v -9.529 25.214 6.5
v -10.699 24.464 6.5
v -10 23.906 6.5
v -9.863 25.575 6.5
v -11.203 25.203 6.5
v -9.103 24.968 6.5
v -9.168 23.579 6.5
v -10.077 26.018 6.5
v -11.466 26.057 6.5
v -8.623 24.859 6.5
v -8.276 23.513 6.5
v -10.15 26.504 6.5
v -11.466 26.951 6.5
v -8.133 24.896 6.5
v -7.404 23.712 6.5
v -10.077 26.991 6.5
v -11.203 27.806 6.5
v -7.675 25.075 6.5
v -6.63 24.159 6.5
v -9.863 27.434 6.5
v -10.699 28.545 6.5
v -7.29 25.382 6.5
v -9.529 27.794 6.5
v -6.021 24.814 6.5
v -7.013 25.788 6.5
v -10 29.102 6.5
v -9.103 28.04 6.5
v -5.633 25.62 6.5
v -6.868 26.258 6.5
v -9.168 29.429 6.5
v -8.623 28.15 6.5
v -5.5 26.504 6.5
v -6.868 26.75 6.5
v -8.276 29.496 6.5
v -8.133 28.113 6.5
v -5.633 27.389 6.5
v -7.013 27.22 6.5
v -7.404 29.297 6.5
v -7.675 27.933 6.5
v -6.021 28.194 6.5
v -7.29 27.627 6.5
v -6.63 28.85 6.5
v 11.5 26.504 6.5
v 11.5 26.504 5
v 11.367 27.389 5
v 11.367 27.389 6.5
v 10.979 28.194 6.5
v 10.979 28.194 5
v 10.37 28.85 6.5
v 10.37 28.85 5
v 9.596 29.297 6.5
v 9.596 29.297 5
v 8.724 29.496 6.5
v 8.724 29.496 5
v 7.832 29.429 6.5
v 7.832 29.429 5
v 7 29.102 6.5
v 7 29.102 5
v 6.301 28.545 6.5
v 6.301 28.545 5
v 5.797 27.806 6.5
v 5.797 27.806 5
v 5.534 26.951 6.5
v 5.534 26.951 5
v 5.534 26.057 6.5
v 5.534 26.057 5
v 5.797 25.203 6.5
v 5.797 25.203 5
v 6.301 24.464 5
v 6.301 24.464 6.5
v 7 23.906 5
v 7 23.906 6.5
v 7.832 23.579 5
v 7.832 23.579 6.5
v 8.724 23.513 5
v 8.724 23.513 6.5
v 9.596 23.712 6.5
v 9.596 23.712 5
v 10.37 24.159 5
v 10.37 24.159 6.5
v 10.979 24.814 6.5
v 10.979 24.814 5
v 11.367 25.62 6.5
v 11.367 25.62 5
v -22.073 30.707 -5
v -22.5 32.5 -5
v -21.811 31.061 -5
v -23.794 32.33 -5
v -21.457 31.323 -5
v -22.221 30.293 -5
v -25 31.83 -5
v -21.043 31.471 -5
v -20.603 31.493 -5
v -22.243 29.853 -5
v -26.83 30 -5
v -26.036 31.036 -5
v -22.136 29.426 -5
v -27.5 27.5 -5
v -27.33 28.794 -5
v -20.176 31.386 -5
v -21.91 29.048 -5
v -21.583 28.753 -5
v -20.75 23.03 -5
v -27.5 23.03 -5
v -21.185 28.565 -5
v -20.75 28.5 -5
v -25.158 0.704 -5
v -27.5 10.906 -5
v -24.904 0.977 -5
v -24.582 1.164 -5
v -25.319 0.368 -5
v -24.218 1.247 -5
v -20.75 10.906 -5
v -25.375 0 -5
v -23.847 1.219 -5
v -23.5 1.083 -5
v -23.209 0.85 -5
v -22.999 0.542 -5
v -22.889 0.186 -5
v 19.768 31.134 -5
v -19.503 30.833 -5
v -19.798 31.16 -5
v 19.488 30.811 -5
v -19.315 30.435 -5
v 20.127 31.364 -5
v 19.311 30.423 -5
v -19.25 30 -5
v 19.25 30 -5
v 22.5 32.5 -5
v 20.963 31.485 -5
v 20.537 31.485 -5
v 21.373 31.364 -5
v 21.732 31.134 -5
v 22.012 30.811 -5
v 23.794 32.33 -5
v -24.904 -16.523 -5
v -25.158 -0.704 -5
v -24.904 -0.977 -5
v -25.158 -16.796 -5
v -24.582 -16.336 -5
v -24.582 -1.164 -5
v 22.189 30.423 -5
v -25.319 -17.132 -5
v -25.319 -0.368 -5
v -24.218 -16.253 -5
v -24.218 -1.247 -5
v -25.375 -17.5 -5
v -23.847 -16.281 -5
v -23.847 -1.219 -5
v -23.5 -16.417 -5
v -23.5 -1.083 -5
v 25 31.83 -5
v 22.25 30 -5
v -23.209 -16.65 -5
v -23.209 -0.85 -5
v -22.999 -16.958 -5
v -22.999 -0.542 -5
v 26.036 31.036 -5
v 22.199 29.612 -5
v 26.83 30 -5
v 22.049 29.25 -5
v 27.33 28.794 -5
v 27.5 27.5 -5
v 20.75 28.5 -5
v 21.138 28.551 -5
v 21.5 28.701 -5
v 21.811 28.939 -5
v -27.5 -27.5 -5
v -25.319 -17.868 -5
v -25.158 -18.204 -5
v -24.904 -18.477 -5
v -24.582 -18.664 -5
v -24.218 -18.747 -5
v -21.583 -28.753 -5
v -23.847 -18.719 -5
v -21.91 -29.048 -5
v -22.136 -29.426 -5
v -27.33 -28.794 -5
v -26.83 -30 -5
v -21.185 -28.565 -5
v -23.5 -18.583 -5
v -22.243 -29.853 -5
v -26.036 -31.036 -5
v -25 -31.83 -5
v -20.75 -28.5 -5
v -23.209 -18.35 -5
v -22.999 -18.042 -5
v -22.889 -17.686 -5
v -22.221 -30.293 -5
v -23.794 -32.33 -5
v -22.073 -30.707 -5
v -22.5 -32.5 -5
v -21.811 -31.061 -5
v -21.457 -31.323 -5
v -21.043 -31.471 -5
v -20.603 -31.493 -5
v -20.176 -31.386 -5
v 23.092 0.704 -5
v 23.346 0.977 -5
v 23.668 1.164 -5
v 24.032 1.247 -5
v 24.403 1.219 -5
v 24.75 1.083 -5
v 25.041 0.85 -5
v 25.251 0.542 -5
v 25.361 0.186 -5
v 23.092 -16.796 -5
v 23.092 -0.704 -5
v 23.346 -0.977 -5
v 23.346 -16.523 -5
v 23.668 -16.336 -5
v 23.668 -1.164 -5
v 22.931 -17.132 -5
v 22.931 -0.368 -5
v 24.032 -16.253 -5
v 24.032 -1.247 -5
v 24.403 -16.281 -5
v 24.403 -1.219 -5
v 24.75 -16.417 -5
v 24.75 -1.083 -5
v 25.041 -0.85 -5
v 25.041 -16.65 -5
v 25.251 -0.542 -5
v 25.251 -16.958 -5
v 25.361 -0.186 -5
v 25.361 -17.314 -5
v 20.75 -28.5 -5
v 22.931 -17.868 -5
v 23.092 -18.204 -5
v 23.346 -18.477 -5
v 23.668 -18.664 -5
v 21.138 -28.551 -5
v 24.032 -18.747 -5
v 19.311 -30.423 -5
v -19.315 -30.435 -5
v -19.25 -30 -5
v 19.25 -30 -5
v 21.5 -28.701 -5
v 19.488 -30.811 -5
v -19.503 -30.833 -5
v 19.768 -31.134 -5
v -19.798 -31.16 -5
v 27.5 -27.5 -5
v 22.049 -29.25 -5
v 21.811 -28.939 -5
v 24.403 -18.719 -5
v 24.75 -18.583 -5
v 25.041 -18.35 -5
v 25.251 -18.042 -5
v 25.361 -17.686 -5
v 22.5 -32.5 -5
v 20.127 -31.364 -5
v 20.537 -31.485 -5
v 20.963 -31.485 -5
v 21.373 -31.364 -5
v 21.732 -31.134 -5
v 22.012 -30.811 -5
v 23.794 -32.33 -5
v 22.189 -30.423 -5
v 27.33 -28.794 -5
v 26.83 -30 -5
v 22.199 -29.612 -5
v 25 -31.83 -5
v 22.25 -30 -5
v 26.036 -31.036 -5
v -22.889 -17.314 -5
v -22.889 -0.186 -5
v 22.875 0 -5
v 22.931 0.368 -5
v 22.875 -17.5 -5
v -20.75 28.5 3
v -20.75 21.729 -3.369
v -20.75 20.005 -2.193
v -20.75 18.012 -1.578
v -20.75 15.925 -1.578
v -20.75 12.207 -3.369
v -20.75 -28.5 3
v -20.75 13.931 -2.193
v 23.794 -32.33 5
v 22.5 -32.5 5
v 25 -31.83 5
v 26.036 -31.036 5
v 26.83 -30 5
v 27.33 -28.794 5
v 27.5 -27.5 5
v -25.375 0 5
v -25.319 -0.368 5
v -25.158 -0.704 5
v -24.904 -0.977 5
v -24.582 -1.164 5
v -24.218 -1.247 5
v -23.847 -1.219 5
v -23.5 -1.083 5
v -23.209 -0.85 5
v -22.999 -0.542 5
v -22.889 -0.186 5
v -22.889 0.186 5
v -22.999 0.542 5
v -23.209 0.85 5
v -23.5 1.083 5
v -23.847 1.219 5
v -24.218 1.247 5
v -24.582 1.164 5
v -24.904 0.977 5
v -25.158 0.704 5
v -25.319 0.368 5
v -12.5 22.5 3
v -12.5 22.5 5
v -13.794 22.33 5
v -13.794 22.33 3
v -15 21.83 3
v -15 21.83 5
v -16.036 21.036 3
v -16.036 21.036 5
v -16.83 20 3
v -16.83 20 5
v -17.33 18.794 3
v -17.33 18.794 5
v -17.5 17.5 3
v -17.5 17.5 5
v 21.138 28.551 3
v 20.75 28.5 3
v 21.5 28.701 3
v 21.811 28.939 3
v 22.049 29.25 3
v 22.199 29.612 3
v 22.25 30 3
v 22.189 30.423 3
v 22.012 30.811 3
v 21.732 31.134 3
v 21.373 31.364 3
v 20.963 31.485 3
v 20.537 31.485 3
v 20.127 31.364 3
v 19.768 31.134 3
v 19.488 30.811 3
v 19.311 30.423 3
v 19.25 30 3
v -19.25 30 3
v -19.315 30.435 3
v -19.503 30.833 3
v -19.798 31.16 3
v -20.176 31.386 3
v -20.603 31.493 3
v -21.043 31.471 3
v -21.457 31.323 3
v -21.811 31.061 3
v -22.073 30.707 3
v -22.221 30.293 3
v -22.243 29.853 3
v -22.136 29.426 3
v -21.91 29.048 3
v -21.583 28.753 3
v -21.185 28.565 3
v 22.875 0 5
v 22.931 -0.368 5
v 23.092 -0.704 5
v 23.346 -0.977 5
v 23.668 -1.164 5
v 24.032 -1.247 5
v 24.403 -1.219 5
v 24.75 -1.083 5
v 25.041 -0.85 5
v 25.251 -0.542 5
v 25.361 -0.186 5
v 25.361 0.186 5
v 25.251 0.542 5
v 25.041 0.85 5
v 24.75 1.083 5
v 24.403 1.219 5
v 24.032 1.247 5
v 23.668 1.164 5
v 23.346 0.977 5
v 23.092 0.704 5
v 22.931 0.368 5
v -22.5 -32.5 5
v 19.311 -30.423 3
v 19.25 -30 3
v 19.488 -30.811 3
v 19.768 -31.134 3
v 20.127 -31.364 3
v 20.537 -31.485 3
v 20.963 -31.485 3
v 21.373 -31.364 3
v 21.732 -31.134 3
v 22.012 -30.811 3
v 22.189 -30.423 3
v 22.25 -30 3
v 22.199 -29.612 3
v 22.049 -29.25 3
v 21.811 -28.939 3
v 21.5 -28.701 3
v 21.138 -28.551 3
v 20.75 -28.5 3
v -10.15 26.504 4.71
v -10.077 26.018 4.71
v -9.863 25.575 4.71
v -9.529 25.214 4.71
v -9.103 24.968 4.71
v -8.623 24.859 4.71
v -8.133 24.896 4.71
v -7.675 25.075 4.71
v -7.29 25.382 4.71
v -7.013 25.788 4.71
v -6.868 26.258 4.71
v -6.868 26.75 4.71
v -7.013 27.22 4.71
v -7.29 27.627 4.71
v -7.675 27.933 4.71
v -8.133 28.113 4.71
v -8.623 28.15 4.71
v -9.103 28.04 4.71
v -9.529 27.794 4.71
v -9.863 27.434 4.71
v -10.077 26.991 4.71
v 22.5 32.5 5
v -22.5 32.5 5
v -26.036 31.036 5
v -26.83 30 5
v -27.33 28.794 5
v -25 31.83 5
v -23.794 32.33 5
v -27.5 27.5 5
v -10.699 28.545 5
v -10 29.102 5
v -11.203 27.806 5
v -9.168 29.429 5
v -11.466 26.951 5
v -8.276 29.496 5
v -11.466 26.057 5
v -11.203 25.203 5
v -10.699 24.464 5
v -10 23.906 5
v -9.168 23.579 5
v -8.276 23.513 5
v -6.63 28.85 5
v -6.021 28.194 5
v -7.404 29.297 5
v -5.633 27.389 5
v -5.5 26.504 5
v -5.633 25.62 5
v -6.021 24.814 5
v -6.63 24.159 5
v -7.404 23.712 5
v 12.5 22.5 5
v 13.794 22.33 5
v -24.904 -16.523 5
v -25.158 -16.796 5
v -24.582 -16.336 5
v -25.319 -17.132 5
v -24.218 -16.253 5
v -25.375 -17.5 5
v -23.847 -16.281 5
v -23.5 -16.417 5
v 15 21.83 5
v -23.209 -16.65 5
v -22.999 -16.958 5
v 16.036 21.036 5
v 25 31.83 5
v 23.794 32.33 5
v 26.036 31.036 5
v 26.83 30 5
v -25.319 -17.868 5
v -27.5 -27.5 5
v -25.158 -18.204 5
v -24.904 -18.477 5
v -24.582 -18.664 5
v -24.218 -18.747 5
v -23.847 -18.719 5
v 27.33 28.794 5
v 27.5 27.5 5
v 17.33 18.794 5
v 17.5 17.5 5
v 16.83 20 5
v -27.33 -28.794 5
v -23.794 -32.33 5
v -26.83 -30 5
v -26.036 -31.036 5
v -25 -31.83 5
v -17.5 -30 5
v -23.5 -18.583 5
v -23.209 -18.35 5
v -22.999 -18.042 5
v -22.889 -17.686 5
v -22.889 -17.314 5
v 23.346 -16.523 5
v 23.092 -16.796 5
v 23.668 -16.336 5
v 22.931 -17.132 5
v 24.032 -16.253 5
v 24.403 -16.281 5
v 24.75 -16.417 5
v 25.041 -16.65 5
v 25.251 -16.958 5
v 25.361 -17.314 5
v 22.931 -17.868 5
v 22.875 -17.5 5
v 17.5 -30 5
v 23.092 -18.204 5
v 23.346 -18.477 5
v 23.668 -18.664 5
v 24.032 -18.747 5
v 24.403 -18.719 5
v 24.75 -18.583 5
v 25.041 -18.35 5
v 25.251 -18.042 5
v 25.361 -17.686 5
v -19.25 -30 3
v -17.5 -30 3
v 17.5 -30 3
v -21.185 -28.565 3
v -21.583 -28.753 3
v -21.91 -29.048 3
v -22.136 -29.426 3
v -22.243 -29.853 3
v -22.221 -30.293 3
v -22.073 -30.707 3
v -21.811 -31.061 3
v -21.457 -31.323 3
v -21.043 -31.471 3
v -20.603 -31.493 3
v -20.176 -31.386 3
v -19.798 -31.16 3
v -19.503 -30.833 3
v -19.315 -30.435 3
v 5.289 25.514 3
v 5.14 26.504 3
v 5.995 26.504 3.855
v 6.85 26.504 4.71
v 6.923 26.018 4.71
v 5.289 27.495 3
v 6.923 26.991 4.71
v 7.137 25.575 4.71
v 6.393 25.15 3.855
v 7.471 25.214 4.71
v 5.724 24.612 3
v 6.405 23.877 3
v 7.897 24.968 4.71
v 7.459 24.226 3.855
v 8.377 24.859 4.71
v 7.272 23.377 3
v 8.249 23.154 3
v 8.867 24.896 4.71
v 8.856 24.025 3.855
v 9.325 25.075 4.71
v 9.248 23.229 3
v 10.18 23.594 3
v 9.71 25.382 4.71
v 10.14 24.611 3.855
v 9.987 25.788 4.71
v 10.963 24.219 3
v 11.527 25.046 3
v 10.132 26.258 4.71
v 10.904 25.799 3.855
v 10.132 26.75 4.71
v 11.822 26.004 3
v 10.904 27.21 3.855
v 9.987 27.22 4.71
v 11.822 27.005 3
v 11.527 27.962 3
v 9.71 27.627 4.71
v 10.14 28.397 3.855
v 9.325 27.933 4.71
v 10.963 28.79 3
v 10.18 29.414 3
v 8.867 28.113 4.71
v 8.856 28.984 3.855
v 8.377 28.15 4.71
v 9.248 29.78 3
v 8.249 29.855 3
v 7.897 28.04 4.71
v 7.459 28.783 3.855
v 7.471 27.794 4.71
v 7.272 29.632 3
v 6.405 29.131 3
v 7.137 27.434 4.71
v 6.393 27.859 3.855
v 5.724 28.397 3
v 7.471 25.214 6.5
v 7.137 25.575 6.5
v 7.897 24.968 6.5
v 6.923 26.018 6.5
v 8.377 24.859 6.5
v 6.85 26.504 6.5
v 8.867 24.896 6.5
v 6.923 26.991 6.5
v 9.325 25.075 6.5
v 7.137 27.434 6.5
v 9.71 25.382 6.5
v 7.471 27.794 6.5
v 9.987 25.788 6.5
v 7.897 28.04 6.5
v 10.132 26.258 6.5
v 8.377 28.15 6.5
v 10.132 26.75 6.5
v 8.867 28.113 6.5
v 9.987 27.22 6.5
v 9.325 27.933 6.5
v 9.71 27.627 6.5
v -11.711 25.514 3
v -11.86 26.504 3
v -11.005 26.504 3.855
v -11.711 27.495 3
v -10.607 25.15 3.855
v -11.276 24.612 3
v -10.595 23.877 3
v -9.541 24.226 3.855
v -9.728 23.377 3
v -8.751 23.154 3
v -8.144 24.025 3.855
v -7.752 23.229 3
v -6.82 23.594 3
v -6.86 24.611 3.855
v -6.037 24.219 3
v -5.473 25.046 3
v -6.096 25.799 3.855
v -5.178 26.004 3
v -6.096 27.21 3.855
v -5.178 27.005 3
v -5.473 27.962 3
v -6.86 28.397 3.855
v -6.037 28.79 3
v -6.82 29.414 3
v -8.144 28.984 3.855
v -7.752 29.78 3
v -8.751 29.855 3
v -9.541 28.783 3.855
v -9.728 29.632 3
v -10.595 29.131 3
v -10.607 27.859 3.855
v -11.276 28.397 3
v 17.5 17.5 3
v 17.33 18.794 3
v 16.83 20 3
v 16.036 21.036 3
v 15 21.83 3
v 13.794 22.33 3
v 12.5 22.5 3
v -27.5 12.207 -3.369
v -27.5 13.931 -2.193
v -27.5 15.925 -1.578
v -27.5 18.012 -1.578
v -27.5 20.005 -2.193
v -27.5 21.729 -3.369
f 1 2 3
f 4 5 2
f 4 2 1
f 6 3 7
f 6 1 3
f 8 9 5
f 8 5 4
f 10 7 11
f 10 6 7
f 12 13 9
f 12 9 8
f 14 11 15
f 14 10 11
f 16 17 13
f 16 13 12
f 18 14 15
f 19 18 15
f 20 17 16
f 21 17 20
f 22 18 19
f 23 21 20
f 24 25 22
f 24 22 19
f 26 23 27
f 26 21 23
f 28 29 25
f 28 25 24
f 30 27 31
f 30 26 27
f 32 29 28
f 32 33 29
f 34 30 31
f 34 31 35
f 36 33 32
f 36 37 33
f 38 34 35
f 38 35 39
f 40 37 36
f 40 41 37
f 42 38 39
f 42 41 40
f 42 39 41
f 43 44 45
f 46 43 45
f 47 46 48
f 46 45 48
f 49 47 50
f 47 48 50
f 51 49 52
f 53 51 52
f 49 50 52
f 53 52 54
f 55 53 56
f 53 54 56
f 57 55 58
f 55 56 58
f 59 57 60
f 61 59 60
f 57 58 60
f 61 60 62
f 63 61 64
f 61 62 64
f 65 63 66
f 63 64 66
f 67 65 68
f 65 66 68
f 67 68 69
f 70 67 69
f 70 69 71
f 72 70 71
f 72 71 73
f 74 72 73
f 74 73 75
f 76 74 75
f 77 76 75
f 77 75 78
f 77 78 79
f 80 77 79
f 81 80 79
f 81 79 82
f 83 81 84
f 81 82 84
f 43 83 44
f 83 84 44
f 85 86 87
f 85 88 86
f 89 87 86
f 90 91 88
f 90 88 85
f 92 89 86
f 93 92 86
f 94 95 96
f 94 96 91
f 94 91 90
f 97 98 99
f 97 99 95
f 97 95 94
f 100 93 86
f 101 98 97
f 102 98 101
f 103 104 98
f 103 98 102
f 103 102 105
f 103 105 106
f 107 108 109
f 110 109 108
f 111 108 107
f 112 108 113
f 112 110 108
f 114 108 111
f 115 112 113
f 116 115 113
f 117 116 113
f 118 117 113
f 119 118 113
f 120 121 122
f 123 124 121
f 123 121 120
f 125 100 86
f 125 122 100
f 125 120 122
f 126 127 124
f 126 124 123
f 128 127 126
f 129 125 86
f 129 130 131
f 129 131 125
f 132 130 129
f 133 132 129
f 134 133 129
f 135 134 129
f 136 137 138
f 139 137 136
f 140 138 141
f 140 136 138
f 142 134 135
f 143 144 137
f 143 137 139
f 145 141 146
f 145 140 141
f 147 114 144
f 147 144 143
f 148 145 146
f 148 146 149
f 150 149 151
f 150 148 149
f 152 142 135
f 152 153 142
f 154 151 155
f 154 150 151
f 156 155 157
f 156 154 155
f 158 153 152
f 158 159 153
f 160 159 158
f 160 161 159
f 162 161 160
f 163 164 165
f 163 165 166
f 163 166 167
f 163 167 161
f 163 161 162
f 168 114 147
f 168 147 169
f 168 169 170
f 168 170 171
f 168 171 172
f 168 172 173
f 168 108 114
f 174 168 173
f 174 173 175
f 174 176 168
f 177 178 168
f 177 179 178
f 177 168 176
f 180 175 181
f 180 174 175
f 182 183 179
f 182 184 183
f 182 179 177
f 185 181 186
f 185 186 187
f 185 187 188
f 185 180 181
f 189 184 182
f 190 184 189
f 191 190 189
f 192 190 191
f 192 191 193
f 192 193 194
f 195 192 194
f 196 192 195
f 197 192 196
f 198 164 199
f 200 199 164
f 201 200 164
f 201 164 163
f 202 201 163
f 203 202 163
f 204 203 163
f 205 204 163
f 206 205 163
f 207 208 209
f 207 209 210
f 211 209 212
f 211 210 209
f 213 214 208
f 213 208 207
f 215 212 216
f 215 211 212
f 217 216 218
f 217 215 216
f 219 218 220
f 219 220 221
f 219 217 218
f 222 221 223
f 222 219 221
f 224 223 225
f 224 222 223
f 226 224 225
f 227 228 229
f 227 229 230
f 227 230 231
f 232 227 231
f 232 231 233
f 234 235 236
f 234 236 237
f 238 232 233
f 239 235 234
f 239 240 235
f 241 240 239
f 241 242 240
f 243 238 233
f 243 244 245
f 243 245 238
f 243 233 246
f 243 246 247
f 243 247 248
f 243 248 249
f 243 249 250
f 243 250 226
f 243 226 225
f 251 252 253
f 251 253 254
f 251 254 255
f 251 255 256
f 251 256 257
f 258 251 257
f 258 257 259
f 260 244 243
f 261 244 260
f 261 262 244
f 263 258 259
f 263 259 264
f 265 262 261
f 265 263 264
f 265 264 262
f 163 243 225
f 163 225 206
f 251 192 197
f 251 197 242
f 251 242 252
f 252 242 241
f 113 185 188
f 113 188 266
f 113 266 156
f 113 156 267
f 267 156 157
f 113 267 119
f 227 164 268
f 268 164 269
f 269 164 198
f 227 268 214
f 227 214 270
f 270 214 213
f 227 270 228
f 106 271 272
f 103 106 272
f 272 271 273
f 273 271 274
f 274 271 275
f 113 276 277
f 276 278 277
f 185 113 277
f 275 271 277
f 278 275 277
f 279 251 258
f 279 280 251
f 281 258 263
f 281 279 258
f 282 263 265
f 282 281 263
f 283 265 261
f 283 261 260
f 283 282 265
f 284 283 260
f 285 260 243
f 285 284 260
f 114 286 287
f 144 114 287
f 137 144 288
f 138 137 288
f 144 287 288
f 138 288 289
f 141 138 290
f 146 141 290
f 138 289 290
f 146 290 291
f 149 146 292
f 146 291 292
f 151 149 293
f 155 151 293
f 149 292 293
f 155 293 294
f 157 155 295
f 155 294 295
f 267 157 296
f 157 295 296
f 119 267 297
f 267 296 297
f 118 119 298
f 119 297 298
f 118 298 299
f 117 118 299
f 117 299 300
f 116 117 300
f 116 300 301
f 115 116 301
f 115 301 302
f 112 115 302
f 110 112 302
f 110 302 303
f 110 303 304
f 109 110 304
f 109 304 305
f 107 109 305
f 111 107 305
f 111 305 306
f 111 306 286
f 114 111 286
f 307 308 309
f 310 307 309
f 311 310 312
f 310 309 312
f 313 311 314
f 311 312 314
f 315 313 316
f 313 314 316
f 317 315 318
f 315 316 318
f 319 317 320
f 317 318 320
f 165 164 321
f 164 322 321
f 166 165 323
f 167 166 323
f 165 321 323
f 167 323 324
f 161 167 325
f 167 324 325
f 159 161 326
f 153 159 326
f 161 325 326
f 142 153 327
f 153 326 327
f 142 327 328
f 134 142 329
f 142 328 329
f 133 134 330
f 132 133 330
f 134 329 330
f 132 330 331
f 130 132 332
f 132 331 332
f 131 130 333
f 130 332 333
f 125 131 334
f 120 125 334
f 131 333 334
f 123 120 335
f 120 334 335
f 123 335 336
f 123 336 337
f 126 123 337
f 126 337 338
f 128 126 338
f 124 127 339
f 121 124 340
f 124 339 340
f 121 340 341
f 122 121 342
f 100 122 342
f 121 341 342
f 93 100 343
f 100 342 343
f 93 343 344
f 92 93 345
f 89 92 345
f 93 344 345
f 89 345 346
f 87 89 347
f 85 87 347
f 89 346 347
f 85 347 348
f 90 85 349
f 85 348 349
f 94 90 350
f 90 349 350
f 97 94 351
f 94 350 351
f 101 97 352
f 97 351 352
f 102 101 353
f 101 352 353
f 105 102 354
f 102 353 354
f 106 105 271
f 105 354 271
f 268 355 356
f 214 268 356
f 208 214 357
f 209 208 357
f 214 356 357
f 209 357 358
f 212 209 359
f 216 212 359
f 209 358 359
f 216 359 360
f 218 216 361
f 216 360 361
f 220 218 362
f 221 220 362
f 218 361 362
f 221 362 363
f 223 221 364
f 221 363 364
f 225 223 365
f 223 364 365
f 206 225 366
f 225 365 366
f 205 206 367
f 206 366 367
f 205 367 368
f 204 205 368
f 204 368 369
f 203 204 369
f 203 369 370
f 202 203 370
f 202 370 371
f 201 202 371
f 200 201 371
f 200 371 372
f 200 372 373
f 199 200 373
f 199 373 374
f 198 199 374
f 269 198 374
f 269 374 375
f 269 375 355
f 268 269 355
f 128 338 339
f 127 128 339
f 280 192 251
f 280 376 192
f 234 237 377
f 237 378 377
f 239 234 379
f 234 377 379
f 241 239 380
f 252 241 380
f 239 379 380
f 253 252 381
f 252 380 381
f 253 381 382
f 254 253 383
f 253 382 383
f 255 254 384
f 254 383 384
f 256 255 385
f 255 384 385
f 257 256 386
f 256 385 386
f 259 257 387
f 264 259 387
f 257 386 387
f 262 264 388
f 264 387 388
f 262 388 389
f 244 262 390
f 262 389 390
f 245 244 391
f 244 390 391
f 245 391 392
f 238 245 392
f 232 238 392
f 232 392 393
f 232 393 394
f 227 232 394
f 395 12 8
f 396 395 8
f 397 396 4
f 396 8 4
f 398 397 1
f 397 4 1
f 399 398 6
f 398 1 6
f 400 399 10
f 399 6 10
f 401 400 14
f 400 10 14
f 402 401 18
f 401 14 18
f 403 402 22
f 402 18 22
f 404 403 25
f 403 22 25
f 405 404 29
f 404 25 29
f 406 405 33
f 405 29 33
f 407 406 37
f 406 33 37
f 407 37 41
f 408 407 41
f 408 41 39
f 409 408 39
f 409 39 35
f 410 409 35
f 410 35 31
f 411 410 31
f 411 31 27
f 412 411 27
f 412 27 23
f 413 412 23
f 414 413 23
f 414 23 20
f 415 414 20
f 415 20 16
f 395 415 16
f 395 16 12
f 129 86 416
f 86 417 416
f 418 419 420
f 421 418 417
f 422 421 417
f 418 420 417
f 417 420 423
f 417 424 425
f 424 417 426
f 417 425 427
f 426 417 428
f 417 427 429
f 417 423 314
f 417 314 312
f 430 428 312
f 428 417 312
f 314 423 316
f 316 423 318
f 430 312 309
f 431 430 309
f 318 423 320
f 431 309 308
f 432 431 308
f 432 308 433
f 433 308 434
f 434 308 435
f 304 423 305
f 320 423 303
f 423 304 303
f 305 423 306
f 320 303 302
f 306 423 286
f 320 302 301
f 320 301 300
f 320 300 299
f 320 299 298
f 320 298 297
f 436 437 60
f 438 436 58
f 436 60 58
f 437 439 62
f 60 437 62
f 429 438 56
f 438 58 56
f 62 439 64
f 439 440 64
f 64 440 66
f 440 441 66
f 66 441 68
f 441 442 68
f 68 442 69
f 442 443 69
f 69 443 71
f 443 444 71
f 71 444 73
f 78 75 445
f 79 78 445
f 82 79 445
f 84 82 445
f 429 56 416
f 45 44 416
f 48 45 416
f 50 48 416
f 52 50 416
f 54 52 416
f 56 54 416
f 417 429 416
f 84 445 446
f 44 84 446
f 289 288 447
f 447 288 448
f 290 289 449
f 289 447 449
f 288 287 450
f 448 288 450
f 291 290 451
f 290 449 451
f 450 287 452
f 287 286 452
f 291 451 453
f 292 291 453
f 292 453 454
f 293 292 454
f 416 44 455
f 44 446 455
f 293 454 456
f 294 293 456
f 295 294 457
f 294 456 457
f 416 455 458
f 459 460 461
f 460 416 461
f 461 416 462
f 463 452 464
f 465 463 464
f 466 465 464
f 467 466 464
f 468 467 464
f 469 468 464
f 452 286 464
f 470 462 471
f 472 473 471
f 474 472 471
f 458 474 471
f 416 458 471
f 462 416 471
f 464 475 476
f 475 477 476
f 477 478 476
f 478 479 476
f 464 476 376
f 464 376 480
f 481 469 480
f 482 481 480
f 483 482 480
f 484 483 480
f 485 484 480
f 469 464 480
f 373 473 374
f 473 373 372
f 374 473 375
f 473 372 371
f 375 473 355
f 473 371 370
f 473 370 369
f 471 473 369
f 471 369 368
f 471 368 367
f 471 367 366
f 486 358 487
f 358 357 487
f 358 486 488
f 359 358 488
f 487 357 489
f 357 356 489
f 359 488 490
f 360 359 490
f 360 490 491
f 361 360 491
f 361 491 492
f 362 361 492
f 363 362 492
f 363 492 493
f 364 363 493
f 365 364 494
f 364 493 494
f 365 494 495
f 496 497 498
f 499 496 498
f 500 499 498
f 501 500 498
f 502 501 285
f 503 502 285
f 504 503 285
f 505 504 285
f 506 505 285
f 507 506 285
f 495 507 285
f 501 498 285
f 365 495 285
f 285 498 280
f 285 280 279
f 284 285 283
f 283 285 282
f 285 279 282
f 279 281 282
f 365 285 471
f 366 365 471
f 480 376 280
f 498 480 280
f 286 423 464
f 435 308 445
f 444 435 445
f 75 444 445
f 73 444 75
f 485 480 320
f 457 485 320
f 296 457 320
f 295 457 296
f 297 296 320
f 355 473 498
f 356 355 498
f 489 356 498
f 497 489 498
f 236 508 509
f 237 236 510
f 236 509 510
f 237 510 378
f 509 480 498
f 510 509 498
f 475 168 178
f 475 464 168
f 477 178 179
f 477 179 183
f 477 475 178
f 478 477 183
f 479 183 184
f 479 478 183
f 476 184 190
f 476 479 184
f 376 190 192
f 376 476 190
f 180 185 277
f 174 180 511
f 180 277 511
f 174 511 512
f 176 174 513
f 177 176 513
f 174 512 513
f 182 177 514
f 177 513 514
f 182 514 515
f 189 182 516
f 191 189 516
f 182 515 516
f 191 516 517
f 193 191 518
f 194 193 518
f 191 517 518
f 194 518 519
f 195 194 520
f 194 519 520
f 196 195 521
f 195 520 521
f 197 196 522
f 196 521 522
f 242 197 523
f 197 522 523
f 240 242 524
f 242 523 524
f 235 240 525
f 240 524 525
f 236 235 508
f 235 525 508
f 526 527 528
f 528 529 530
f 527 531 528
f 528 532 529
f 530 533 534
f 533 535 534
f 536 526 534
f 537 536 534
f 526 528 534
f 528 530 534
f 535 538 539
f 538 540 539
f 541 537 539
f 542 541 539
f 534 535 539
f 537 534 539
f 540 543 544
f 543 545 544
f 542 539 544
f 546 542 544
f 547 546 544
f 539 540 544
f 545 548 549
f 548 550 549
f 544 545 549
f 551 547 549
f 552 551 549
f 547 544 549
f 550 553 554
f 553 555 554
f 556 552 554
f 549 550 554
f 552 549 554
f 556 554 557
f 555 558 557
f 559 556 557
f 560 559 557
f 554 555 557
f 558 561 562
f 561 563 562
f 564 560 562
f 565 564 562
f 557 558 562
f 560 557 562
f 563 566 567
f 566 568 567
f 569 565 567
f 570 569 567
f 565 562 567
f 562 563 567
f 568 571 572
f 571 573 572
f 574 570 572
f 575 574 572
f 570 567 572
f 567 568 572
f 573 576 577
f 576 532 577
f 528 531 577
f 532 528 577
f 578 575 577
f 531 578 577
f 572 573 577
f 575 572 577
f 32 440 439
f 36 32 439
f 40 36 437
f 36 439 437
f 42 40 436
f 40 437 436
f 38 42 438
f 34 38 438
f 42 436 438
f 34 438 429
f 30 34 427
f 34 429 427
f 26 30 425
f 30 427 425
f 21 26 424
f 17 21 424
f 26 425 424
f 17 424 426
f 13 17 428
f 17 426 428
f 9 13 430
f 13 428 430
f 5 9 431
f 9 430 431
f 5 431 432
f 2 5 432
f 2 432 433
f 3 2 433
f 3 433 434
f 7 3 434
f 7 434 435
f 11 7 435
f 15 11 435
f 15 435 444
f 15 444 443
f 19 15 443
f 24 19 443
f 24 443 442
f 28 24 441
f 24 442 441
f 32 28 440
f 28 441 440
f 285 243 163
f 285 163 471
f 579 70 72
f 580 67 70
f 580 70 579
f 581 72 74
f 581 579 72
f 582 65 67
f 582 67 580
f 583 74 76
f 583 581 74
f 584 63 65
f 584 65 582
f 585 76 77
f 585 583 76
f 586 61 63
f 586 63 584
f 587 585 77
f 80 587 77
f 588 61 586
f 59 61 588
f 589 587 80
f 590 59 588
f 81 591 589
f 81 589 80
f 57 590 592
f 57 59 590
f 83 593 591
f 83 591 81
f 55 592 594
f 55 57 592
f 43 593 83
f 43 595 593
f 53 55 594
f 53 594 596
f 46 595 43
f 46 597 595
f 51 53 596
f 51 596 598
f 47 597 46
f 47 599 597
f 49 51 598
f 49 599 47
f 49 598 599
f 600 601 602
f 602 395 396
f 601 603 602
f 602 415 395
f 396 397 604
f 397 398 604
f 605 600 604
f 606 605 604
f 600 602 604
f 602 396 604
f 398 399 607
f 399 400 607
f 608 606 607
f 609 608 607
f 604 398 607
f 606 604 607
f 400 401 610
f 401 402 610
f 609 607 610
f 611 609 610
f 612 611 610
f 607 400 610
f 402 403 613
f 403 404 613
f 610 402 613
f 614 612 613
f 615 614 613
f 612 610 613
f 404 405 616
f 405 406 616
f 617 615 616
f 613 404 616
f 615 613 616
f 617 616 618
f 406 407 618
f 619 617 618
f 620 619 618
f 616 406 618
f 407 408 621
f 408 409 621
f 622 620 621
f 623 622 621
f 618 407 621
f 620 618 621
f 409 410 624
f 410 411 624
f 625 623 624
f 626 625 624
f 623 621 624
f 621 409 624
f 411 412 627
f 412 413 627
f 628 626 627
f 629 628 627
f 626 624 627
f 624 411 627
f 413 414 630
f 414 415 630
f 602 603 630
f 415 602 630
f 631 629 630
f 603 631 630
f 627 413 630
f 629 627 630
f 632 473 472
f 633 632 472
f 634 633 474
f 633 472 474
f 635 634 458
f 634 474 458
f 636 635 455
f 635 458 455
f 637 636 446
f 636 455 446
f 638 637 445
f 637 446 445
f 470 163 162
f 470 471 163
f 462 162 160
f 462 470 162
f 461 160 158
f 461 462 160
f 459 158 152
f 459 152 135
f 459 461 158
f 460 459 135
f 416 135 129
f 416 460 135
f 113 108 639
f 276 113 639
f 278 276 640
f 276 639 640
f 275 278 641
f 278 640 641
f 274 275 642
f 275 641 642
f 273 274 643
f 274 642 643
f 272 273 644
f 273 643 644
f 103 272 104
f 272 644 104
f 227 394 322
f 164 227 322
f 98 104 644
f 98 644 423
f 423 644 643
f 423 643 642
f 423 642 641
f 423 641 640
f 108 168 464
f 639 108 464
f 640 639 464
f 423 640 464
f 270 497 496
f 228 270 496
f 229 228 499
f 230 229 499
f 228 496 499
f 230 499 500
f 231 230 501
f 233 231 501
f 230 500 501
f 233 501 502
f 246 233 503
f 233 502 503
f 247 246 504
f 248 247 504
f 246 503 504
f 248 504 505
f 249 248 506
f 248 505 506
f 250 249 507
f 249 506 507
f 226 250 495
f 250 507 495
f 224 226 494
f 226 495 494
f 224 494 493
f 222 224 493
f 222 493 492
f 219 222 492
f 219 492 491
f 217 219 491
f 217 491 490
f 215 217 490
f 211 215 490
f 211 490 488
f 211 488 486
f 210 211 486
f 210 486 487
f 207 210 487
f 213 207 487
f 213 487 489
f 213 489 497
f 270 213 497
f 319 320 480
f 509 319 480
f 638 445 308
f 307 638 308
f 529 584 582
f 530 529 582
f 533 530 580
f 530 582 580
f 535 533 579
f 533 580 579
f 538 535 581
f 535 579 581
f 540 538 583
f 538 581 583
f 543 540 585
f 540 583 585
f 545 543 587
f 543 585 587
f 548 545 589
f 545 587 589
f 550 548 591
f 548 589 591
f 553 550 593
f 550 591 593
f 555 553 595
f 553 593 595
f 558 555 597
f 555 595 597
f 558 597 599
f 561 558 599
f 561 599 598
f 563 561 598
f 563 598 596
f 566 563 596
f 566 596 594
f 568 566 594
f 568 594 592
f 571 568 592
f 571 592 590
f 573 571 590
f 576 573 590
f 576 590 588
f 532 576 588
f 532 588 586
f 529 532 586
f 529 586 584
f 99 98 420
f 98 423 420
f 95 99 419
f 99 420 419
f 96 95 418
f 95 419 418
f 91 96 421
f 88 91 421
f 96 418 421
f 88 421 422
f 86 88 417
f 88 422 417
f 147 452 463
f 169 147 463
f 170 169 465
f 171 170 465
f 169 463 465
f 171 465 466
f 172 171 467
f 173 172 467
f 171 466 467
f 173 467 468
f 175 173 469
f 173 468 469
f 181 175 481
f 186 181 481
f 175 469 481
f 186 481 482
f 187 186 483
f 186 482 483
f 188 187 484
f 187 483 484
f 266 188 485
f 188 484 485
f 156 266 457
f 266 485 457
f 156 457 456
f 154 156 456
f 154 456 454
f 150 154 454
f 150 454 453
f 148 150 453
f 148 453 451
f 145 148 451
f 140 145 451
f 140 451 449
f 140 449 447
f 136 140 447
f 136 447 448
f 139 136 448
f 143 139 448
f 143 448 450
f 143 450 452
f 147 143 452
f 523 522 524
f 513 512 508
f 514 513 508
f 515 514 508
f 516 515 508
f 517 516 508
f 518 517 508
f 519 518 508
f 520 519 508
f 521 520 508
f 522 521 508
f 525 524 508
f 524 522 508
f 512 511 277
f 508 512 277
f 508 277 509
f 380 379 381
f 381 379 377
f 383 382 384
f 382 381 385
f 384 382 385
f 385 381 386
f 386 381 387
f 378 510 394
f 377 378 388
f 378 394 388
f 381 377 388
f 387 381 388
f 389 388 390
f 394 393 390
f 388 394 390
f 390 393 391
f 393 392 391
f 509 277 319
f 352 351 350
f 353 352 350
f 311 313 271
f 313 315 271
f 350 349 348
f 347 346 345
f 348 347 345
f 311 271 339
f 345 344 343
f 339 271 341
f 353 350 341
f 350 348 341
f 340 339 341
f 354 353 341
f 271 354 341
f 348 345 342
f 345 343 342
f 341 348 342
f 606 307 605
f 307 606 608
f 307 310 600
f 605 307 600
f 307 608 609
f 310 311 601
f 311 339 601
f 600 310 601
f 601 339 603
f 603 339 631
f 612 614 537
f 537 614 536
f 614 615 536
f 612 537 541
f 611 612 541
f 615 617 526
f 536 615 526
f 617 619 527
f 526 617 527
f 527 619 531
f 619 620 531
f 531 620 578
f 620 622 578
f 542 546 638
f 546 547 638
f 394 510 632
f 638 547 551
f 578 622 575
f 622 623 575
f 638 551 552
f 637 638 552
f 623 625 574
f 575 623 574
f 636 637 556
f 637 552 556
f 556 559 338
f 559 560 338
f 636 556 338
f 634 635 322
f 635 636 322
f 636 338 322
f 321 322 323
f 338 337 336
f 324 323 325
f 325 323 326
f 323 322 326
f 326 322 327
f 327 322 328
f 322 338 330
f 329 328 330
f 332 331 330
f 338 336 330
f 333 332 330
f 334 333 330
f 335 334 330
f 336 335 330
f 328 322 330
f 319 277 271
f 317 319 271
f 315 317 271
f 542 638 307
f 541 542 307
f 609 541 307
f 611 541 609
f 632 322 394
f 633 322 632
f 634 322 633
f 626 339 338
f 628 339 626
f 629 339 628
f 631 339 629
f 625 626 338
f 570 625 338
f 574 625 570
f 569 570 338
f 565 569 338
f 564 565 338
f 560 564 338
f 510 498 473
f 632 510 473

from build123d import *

# Parameters (mm, degrees)
F0_W            = 55
F0_H            = 10
F1_DEPTH        = 32.5
F3_R            = 5
F4_DEPTH        = 12.5
F6_DEPTH        = 30
F7_DEPTH        = 3
F9_D            = 3.3
F9_CSINK_D      = 6.72
F9_CSINK_ANGLE  = 90
F10_R           = 3
F11_DEPTH       = 1.5
F12_D           = 3.3
F12_DEPTH       = 13.5
F12_CSINK_D     = 6.72
F12_CSINK_ANGLE = 90
F12_TIP         = 0.9914200214
F14_D           = 2.5
F14_DEPTH       = 13.5
F14_TIP         = 0.7510757738
F16_DEPTH       = 12


# Not quite as in the source:
# - a feature names something its author has since deleted; it is built from what else it names


with BuildPart() as f1:
    # F0 (on Front) → F1 (new body, symmetric)
    with BuildSketch(Plane.XZ):
        Rectangle(F0_W, F0_H)
    extrude(amount=F1_DEPTH, both=True)

    # F3
    f3_edges = [f1.edges().sort_by_distance(p)[0] for p in [
        (27.5, -32.5, 0),
        (-27.5, -32.5, 0),
        (-27.5, 32.5, 0),
        (27.5, 32.5, 0),
    ]]
    fillet(f3_edges, radius=F3_R)

    # F2 (on Top) → F4 (cut, symmetric)
    with BuildSketch(Plane.XY):
        with BuildLine():
            ThreePointArc((-12.5, 22.5), (-16.0355339059, 21.0355339059), (-17.5, 17.5))
            Line((-17.5, 17.5), (-17.5, -30))
            Line((-17.5, -30), (17.5, -30))
            Line((17.5, -30), (17.5, 17.5))
            ThreePointArc((17.5, 17.5), (16.0355339059, 21.0355339059), (12.5, 22.5))
            Line((12.5, 22.5), (-12.5, 22.5))
        make_face()
    extrude(amount=F4_DEPTH, both=True, mode=Mode.SUBTRACT)

    # F5 (on Top) → F6 (cut)
    with BuildSketch(Plane.XY):
        with BuildLine():
            ThreePointArc((-20.75, -28.5), (-21.8106601718, -31.0606601718), (-19.25, -30))
            Line((-19.25, -30), (-20.75, -30))
            Line((-20.75, -30), (-20.75, -28.5))
        make_face()
        with BuildLine():
            ThreePointArc((-20.75, -28.5), (-19.6893398282, -28.9393398282), (-19.25, -30))
            Line((-19.25, -30), (19.25, -30))
            ThreePointArc((19.25, -30), (19.6893398282, -28.9393398282), (20.75, -28.5))
            Line((20.75, -28.5), (20.75, 28.5))
            ThreePointArc((20.75, 28.5), (19.6893398282, 28.9393398282), (19.25, 30))
            Line((19.25, 30), (-19.25, 30))
            ThreePointArc((-19.25, 30), (-19.6893398282, 28.9393398282), (-20.75, 28.5))
            Line((-20.75, 28.5), (-20.75, -28.5))
        make_face()
        with BuildLine():
            Line((-20.75, -30), (-19.25, -30))
            ThreePointArc((-19.25, -30), (-19.6893398282, -28.9393398282), (-20.75, -28.5))
            Line((-20.75, -28.5), (-20.75, -30))
        make_face()
        with BuildLine():
            ThreePointArc((20.75, -28.5), (19.6893398282, -28.9393398282), (19.25, -30))
            Line((19.25, -30), (20.75, -30))
            Line((20.75, -30), (20.75, -28.5))
        make_face()
        with BuildLine():
            Line((20.75, -30), (19.25, -30))
            ThreePointArc((19.25, -30), (20.75, -31.5), (22.25, -30))
            ThreePointArc((22.25, -30), (21.8106601718, -28.9393398282), (20.75, -28.5))
            Line((20.75, -28.5), (20.75, -30))
        make_face()
        with BuildLine():
            ThreePointArc((-19.25, 30), (-21.8106601718, 31.0606601718), (-20.75, 28.5))
            Line((-20.75, 28.5), (-20.75, 30))
            Line((-20.75, 30), (-19.25, 30))
        make_face()
        with BuildLine():
            Line((-20.75, 30), (-20.75, 28.5))
            ThreePointArc((-20.75, 28.5), (-19.6893398282, 28.9393398282), (-19.25, 30))
            Line((-19.25, 30), (-20.75, 30))
        make_face()
        with BuildLine():
            ThreePointArc((19.25, 30), (19.6893398282, 28.9393398282), (20.75, 28.5))
            Line((20.75, 28.5), (20.75, 30))
            Line((20.75, 30), (19.25, 30))
        make_face()
        with BuildLine():
            Line((20.75, 30), (20.75, 28.5))
            ThreePointArc((20.75, 28.5), (21.8106601718, 28.9393398282), (22.25, 30))
            ThreePointArc((22.25, 30), (20.75, 31.5), (19.25, 30))
            Line((19.25, 30), (20.75, 30))
        make_face()
    extrude(amount=-F6_DEPTH, mode=Mode.SUBTRACT)

    # F5 (on Top) → F7 (cut)
    with BuildSketch(Plane.XY):
        with BuildLine():
            ThreePointArc((-20.75, -28.5), (-21.8106601718, -31.0606601718), (-19.25, -30))
            Line((-19.25, -30), (-20.75, -30))
            Line((-20.75, -30), (-20.75, -28.5))
        make_face()
        with BuildLine():
            ThreePointArc((-20.75, -28.5), (-19.6893398282, -28.9393398282), (-19.25, -30))
            Line((-19.25, -30), (19.25, -30))
            ThreePointArc((19.25, -30), (19.6893398282, -28.9393398282), (20.75, -28.5))
            Line((20.75, -28.5), (20.75, 28.5))
            ThreePointArc((20.75, 28.5), (19.6893398282, 28.9393398282), (19.25, 30))
            Line((19.25, 30), (-19.25, 30))
            ThreePointArc((-19.25, 30), (-19.6893398282, 28.9393398282), (-20.75, 28.5))
            Line((-20.75, 28.5), (-20.75, -28.5))
        make_face()
        with BuildLine():
            Line((-20.75, -30), (-19.25, -30))
            ThreePointArc((-19.25, -30), (-19.6893398282, -28.9393398282), (-20.75, -28.5))
            Line((-20.75, -28.5), (-20.75, -30))
        make_face()
        with BuildLine():
            ThreePointArc((20.75, -28.5), (19.6893398282, -28.9393398282), (19.25, -30))
            Line((19.25, -30), (20.75, -30))
            Line((20.75, -30), (20.75, -28.5))
        make_face()
        with BuildLine():
            Line((20.75, -30), (19.25, -30))
            ThreePointArc((19.25, -30), (20.75, -31.5), (22.25, -30))
            ThreePointArc((22.25, -30), (21.8106601718, -28.9393398282), (20.75, -28.5))
            Line((20.75, -28.5), (20.75, -30))
        make_face()
        with BuildLine():
            ThreePointArc((-19.25, 30), (-21.8106601718, 31.0606601718), (-20.75, 28.5))
            Line((-20.75, 28.5), (-20.75, 30))
            Line((-20.75, 30), (-19.25, 30))
        make_face()
        with BuildLine():
            Line((-20.75, 30), (-20.75, 28.5))
            ThreePointArc((-20.75, 28.5), (-19.6893398282, 28.9393398282), (-19.25, 30))
            Line((-19.25, 30), (-20.75, 30))
        make_face()
        with BuildLine():
            ThreePointArc((19.25, 30), (19.6893398282, 28.9393398282), (20.75, 28.5))
            Line((20.75, 28.5), (20.75, 30))
            Line((20.75, 30), (19.25, 30))
        make_face()
        with BuildLine():
            Line((20.75, 30), (20.75, 28.5))
            ThreePointArc((20.75, 28.5), (21.8106601718, 28.9393398282), (22.25, 30))
            ThreePointArc((22.25, 30), (20.75, 31.5), (19.25, 30))
            Line((19.25, 30), (20.75, 30))
        make_face()
    extrude(amount=F7_DEPTH, mode=Mode.SUBTRACT)

    # F9 (through all)
    with Locations(Plane(origin=(0, 0, 3), x_dir=(1, 0, 0), z_dir=(0, 0, -1))):
        with Locations((-8.5, -26.5042820722), (8.5, -26.5042820722)):
            CounterSinkHole(F9_D / 2, F9_CSINK_D / 2, counter_sink_angle=F9_CSINK_ANGLE)

    # F10 (on face) → F11 (join)
    with BuildSketch(Plane.XY.offset(5)):
        with Locations((8.5, 26.5042820722)):
            Circle(F10_R)
        with Locations((-8.5, 26.5042820722)):
            Circle(F10_R)
    extrude(amount=F11_DEPTH)

    # F12
    with Locations(Plane(origin=(0, 0, 3), x_dir=(1, 0, 0), z_dir=(0, 0, -1))):
        with Locations((-8.5, -26.5042820722), (8.5, -26.5042820722)):
            CounterSinkHole(F12_D / 2, F12_CSINK_D / 2, depth=F12_DEPTH, counter_sink_angle=F12_CSINK_ANGLE)
            with Locations((0, 0, -(F12_DEPTH + F12_TIP / 2))):  # 118° drill point
                Cone(0, F12_D / 2, F12_TIP, mode=Mode.SUBTRACT)

    # F14
    with Locations(Plane(origin=(0, 0, -5), x_dir=(1, 0, 0), z_dir=(0, 0, -1))):
        with Locations((-24.125, 0), (24.125, 0), (-24.125, 17.5), (24.125, 17.5)):
            Hole(F14_D / 2, depth=F14_DEPTH)
            with Locations((0, 0, -(F14_DEPTH + F14_TIP / 2))):  # 118° drill point
                Cone(0, F14_D / 2, F14_TIP, mode=Mode.SUBTRACT)

    # F15 (on face) → F16 (cut)
    with BuildSketch(Plane(origin=(-27.5, 0, 0), x_dir=(0, -1, 0), z_dir=(-1, 0, 0))):
        with BuildLine():
            Line((-23.0304132, -5), (-10.906057547, -5))
            ThreePointArc((-10.906057547, -5), (-16.9682353735, -1.5), (-23.0304132, -5))
        make_face()
    extrude(amount=-F16_DEPTH, mode=Mode.SUBTRACT)


solid = f1.part
